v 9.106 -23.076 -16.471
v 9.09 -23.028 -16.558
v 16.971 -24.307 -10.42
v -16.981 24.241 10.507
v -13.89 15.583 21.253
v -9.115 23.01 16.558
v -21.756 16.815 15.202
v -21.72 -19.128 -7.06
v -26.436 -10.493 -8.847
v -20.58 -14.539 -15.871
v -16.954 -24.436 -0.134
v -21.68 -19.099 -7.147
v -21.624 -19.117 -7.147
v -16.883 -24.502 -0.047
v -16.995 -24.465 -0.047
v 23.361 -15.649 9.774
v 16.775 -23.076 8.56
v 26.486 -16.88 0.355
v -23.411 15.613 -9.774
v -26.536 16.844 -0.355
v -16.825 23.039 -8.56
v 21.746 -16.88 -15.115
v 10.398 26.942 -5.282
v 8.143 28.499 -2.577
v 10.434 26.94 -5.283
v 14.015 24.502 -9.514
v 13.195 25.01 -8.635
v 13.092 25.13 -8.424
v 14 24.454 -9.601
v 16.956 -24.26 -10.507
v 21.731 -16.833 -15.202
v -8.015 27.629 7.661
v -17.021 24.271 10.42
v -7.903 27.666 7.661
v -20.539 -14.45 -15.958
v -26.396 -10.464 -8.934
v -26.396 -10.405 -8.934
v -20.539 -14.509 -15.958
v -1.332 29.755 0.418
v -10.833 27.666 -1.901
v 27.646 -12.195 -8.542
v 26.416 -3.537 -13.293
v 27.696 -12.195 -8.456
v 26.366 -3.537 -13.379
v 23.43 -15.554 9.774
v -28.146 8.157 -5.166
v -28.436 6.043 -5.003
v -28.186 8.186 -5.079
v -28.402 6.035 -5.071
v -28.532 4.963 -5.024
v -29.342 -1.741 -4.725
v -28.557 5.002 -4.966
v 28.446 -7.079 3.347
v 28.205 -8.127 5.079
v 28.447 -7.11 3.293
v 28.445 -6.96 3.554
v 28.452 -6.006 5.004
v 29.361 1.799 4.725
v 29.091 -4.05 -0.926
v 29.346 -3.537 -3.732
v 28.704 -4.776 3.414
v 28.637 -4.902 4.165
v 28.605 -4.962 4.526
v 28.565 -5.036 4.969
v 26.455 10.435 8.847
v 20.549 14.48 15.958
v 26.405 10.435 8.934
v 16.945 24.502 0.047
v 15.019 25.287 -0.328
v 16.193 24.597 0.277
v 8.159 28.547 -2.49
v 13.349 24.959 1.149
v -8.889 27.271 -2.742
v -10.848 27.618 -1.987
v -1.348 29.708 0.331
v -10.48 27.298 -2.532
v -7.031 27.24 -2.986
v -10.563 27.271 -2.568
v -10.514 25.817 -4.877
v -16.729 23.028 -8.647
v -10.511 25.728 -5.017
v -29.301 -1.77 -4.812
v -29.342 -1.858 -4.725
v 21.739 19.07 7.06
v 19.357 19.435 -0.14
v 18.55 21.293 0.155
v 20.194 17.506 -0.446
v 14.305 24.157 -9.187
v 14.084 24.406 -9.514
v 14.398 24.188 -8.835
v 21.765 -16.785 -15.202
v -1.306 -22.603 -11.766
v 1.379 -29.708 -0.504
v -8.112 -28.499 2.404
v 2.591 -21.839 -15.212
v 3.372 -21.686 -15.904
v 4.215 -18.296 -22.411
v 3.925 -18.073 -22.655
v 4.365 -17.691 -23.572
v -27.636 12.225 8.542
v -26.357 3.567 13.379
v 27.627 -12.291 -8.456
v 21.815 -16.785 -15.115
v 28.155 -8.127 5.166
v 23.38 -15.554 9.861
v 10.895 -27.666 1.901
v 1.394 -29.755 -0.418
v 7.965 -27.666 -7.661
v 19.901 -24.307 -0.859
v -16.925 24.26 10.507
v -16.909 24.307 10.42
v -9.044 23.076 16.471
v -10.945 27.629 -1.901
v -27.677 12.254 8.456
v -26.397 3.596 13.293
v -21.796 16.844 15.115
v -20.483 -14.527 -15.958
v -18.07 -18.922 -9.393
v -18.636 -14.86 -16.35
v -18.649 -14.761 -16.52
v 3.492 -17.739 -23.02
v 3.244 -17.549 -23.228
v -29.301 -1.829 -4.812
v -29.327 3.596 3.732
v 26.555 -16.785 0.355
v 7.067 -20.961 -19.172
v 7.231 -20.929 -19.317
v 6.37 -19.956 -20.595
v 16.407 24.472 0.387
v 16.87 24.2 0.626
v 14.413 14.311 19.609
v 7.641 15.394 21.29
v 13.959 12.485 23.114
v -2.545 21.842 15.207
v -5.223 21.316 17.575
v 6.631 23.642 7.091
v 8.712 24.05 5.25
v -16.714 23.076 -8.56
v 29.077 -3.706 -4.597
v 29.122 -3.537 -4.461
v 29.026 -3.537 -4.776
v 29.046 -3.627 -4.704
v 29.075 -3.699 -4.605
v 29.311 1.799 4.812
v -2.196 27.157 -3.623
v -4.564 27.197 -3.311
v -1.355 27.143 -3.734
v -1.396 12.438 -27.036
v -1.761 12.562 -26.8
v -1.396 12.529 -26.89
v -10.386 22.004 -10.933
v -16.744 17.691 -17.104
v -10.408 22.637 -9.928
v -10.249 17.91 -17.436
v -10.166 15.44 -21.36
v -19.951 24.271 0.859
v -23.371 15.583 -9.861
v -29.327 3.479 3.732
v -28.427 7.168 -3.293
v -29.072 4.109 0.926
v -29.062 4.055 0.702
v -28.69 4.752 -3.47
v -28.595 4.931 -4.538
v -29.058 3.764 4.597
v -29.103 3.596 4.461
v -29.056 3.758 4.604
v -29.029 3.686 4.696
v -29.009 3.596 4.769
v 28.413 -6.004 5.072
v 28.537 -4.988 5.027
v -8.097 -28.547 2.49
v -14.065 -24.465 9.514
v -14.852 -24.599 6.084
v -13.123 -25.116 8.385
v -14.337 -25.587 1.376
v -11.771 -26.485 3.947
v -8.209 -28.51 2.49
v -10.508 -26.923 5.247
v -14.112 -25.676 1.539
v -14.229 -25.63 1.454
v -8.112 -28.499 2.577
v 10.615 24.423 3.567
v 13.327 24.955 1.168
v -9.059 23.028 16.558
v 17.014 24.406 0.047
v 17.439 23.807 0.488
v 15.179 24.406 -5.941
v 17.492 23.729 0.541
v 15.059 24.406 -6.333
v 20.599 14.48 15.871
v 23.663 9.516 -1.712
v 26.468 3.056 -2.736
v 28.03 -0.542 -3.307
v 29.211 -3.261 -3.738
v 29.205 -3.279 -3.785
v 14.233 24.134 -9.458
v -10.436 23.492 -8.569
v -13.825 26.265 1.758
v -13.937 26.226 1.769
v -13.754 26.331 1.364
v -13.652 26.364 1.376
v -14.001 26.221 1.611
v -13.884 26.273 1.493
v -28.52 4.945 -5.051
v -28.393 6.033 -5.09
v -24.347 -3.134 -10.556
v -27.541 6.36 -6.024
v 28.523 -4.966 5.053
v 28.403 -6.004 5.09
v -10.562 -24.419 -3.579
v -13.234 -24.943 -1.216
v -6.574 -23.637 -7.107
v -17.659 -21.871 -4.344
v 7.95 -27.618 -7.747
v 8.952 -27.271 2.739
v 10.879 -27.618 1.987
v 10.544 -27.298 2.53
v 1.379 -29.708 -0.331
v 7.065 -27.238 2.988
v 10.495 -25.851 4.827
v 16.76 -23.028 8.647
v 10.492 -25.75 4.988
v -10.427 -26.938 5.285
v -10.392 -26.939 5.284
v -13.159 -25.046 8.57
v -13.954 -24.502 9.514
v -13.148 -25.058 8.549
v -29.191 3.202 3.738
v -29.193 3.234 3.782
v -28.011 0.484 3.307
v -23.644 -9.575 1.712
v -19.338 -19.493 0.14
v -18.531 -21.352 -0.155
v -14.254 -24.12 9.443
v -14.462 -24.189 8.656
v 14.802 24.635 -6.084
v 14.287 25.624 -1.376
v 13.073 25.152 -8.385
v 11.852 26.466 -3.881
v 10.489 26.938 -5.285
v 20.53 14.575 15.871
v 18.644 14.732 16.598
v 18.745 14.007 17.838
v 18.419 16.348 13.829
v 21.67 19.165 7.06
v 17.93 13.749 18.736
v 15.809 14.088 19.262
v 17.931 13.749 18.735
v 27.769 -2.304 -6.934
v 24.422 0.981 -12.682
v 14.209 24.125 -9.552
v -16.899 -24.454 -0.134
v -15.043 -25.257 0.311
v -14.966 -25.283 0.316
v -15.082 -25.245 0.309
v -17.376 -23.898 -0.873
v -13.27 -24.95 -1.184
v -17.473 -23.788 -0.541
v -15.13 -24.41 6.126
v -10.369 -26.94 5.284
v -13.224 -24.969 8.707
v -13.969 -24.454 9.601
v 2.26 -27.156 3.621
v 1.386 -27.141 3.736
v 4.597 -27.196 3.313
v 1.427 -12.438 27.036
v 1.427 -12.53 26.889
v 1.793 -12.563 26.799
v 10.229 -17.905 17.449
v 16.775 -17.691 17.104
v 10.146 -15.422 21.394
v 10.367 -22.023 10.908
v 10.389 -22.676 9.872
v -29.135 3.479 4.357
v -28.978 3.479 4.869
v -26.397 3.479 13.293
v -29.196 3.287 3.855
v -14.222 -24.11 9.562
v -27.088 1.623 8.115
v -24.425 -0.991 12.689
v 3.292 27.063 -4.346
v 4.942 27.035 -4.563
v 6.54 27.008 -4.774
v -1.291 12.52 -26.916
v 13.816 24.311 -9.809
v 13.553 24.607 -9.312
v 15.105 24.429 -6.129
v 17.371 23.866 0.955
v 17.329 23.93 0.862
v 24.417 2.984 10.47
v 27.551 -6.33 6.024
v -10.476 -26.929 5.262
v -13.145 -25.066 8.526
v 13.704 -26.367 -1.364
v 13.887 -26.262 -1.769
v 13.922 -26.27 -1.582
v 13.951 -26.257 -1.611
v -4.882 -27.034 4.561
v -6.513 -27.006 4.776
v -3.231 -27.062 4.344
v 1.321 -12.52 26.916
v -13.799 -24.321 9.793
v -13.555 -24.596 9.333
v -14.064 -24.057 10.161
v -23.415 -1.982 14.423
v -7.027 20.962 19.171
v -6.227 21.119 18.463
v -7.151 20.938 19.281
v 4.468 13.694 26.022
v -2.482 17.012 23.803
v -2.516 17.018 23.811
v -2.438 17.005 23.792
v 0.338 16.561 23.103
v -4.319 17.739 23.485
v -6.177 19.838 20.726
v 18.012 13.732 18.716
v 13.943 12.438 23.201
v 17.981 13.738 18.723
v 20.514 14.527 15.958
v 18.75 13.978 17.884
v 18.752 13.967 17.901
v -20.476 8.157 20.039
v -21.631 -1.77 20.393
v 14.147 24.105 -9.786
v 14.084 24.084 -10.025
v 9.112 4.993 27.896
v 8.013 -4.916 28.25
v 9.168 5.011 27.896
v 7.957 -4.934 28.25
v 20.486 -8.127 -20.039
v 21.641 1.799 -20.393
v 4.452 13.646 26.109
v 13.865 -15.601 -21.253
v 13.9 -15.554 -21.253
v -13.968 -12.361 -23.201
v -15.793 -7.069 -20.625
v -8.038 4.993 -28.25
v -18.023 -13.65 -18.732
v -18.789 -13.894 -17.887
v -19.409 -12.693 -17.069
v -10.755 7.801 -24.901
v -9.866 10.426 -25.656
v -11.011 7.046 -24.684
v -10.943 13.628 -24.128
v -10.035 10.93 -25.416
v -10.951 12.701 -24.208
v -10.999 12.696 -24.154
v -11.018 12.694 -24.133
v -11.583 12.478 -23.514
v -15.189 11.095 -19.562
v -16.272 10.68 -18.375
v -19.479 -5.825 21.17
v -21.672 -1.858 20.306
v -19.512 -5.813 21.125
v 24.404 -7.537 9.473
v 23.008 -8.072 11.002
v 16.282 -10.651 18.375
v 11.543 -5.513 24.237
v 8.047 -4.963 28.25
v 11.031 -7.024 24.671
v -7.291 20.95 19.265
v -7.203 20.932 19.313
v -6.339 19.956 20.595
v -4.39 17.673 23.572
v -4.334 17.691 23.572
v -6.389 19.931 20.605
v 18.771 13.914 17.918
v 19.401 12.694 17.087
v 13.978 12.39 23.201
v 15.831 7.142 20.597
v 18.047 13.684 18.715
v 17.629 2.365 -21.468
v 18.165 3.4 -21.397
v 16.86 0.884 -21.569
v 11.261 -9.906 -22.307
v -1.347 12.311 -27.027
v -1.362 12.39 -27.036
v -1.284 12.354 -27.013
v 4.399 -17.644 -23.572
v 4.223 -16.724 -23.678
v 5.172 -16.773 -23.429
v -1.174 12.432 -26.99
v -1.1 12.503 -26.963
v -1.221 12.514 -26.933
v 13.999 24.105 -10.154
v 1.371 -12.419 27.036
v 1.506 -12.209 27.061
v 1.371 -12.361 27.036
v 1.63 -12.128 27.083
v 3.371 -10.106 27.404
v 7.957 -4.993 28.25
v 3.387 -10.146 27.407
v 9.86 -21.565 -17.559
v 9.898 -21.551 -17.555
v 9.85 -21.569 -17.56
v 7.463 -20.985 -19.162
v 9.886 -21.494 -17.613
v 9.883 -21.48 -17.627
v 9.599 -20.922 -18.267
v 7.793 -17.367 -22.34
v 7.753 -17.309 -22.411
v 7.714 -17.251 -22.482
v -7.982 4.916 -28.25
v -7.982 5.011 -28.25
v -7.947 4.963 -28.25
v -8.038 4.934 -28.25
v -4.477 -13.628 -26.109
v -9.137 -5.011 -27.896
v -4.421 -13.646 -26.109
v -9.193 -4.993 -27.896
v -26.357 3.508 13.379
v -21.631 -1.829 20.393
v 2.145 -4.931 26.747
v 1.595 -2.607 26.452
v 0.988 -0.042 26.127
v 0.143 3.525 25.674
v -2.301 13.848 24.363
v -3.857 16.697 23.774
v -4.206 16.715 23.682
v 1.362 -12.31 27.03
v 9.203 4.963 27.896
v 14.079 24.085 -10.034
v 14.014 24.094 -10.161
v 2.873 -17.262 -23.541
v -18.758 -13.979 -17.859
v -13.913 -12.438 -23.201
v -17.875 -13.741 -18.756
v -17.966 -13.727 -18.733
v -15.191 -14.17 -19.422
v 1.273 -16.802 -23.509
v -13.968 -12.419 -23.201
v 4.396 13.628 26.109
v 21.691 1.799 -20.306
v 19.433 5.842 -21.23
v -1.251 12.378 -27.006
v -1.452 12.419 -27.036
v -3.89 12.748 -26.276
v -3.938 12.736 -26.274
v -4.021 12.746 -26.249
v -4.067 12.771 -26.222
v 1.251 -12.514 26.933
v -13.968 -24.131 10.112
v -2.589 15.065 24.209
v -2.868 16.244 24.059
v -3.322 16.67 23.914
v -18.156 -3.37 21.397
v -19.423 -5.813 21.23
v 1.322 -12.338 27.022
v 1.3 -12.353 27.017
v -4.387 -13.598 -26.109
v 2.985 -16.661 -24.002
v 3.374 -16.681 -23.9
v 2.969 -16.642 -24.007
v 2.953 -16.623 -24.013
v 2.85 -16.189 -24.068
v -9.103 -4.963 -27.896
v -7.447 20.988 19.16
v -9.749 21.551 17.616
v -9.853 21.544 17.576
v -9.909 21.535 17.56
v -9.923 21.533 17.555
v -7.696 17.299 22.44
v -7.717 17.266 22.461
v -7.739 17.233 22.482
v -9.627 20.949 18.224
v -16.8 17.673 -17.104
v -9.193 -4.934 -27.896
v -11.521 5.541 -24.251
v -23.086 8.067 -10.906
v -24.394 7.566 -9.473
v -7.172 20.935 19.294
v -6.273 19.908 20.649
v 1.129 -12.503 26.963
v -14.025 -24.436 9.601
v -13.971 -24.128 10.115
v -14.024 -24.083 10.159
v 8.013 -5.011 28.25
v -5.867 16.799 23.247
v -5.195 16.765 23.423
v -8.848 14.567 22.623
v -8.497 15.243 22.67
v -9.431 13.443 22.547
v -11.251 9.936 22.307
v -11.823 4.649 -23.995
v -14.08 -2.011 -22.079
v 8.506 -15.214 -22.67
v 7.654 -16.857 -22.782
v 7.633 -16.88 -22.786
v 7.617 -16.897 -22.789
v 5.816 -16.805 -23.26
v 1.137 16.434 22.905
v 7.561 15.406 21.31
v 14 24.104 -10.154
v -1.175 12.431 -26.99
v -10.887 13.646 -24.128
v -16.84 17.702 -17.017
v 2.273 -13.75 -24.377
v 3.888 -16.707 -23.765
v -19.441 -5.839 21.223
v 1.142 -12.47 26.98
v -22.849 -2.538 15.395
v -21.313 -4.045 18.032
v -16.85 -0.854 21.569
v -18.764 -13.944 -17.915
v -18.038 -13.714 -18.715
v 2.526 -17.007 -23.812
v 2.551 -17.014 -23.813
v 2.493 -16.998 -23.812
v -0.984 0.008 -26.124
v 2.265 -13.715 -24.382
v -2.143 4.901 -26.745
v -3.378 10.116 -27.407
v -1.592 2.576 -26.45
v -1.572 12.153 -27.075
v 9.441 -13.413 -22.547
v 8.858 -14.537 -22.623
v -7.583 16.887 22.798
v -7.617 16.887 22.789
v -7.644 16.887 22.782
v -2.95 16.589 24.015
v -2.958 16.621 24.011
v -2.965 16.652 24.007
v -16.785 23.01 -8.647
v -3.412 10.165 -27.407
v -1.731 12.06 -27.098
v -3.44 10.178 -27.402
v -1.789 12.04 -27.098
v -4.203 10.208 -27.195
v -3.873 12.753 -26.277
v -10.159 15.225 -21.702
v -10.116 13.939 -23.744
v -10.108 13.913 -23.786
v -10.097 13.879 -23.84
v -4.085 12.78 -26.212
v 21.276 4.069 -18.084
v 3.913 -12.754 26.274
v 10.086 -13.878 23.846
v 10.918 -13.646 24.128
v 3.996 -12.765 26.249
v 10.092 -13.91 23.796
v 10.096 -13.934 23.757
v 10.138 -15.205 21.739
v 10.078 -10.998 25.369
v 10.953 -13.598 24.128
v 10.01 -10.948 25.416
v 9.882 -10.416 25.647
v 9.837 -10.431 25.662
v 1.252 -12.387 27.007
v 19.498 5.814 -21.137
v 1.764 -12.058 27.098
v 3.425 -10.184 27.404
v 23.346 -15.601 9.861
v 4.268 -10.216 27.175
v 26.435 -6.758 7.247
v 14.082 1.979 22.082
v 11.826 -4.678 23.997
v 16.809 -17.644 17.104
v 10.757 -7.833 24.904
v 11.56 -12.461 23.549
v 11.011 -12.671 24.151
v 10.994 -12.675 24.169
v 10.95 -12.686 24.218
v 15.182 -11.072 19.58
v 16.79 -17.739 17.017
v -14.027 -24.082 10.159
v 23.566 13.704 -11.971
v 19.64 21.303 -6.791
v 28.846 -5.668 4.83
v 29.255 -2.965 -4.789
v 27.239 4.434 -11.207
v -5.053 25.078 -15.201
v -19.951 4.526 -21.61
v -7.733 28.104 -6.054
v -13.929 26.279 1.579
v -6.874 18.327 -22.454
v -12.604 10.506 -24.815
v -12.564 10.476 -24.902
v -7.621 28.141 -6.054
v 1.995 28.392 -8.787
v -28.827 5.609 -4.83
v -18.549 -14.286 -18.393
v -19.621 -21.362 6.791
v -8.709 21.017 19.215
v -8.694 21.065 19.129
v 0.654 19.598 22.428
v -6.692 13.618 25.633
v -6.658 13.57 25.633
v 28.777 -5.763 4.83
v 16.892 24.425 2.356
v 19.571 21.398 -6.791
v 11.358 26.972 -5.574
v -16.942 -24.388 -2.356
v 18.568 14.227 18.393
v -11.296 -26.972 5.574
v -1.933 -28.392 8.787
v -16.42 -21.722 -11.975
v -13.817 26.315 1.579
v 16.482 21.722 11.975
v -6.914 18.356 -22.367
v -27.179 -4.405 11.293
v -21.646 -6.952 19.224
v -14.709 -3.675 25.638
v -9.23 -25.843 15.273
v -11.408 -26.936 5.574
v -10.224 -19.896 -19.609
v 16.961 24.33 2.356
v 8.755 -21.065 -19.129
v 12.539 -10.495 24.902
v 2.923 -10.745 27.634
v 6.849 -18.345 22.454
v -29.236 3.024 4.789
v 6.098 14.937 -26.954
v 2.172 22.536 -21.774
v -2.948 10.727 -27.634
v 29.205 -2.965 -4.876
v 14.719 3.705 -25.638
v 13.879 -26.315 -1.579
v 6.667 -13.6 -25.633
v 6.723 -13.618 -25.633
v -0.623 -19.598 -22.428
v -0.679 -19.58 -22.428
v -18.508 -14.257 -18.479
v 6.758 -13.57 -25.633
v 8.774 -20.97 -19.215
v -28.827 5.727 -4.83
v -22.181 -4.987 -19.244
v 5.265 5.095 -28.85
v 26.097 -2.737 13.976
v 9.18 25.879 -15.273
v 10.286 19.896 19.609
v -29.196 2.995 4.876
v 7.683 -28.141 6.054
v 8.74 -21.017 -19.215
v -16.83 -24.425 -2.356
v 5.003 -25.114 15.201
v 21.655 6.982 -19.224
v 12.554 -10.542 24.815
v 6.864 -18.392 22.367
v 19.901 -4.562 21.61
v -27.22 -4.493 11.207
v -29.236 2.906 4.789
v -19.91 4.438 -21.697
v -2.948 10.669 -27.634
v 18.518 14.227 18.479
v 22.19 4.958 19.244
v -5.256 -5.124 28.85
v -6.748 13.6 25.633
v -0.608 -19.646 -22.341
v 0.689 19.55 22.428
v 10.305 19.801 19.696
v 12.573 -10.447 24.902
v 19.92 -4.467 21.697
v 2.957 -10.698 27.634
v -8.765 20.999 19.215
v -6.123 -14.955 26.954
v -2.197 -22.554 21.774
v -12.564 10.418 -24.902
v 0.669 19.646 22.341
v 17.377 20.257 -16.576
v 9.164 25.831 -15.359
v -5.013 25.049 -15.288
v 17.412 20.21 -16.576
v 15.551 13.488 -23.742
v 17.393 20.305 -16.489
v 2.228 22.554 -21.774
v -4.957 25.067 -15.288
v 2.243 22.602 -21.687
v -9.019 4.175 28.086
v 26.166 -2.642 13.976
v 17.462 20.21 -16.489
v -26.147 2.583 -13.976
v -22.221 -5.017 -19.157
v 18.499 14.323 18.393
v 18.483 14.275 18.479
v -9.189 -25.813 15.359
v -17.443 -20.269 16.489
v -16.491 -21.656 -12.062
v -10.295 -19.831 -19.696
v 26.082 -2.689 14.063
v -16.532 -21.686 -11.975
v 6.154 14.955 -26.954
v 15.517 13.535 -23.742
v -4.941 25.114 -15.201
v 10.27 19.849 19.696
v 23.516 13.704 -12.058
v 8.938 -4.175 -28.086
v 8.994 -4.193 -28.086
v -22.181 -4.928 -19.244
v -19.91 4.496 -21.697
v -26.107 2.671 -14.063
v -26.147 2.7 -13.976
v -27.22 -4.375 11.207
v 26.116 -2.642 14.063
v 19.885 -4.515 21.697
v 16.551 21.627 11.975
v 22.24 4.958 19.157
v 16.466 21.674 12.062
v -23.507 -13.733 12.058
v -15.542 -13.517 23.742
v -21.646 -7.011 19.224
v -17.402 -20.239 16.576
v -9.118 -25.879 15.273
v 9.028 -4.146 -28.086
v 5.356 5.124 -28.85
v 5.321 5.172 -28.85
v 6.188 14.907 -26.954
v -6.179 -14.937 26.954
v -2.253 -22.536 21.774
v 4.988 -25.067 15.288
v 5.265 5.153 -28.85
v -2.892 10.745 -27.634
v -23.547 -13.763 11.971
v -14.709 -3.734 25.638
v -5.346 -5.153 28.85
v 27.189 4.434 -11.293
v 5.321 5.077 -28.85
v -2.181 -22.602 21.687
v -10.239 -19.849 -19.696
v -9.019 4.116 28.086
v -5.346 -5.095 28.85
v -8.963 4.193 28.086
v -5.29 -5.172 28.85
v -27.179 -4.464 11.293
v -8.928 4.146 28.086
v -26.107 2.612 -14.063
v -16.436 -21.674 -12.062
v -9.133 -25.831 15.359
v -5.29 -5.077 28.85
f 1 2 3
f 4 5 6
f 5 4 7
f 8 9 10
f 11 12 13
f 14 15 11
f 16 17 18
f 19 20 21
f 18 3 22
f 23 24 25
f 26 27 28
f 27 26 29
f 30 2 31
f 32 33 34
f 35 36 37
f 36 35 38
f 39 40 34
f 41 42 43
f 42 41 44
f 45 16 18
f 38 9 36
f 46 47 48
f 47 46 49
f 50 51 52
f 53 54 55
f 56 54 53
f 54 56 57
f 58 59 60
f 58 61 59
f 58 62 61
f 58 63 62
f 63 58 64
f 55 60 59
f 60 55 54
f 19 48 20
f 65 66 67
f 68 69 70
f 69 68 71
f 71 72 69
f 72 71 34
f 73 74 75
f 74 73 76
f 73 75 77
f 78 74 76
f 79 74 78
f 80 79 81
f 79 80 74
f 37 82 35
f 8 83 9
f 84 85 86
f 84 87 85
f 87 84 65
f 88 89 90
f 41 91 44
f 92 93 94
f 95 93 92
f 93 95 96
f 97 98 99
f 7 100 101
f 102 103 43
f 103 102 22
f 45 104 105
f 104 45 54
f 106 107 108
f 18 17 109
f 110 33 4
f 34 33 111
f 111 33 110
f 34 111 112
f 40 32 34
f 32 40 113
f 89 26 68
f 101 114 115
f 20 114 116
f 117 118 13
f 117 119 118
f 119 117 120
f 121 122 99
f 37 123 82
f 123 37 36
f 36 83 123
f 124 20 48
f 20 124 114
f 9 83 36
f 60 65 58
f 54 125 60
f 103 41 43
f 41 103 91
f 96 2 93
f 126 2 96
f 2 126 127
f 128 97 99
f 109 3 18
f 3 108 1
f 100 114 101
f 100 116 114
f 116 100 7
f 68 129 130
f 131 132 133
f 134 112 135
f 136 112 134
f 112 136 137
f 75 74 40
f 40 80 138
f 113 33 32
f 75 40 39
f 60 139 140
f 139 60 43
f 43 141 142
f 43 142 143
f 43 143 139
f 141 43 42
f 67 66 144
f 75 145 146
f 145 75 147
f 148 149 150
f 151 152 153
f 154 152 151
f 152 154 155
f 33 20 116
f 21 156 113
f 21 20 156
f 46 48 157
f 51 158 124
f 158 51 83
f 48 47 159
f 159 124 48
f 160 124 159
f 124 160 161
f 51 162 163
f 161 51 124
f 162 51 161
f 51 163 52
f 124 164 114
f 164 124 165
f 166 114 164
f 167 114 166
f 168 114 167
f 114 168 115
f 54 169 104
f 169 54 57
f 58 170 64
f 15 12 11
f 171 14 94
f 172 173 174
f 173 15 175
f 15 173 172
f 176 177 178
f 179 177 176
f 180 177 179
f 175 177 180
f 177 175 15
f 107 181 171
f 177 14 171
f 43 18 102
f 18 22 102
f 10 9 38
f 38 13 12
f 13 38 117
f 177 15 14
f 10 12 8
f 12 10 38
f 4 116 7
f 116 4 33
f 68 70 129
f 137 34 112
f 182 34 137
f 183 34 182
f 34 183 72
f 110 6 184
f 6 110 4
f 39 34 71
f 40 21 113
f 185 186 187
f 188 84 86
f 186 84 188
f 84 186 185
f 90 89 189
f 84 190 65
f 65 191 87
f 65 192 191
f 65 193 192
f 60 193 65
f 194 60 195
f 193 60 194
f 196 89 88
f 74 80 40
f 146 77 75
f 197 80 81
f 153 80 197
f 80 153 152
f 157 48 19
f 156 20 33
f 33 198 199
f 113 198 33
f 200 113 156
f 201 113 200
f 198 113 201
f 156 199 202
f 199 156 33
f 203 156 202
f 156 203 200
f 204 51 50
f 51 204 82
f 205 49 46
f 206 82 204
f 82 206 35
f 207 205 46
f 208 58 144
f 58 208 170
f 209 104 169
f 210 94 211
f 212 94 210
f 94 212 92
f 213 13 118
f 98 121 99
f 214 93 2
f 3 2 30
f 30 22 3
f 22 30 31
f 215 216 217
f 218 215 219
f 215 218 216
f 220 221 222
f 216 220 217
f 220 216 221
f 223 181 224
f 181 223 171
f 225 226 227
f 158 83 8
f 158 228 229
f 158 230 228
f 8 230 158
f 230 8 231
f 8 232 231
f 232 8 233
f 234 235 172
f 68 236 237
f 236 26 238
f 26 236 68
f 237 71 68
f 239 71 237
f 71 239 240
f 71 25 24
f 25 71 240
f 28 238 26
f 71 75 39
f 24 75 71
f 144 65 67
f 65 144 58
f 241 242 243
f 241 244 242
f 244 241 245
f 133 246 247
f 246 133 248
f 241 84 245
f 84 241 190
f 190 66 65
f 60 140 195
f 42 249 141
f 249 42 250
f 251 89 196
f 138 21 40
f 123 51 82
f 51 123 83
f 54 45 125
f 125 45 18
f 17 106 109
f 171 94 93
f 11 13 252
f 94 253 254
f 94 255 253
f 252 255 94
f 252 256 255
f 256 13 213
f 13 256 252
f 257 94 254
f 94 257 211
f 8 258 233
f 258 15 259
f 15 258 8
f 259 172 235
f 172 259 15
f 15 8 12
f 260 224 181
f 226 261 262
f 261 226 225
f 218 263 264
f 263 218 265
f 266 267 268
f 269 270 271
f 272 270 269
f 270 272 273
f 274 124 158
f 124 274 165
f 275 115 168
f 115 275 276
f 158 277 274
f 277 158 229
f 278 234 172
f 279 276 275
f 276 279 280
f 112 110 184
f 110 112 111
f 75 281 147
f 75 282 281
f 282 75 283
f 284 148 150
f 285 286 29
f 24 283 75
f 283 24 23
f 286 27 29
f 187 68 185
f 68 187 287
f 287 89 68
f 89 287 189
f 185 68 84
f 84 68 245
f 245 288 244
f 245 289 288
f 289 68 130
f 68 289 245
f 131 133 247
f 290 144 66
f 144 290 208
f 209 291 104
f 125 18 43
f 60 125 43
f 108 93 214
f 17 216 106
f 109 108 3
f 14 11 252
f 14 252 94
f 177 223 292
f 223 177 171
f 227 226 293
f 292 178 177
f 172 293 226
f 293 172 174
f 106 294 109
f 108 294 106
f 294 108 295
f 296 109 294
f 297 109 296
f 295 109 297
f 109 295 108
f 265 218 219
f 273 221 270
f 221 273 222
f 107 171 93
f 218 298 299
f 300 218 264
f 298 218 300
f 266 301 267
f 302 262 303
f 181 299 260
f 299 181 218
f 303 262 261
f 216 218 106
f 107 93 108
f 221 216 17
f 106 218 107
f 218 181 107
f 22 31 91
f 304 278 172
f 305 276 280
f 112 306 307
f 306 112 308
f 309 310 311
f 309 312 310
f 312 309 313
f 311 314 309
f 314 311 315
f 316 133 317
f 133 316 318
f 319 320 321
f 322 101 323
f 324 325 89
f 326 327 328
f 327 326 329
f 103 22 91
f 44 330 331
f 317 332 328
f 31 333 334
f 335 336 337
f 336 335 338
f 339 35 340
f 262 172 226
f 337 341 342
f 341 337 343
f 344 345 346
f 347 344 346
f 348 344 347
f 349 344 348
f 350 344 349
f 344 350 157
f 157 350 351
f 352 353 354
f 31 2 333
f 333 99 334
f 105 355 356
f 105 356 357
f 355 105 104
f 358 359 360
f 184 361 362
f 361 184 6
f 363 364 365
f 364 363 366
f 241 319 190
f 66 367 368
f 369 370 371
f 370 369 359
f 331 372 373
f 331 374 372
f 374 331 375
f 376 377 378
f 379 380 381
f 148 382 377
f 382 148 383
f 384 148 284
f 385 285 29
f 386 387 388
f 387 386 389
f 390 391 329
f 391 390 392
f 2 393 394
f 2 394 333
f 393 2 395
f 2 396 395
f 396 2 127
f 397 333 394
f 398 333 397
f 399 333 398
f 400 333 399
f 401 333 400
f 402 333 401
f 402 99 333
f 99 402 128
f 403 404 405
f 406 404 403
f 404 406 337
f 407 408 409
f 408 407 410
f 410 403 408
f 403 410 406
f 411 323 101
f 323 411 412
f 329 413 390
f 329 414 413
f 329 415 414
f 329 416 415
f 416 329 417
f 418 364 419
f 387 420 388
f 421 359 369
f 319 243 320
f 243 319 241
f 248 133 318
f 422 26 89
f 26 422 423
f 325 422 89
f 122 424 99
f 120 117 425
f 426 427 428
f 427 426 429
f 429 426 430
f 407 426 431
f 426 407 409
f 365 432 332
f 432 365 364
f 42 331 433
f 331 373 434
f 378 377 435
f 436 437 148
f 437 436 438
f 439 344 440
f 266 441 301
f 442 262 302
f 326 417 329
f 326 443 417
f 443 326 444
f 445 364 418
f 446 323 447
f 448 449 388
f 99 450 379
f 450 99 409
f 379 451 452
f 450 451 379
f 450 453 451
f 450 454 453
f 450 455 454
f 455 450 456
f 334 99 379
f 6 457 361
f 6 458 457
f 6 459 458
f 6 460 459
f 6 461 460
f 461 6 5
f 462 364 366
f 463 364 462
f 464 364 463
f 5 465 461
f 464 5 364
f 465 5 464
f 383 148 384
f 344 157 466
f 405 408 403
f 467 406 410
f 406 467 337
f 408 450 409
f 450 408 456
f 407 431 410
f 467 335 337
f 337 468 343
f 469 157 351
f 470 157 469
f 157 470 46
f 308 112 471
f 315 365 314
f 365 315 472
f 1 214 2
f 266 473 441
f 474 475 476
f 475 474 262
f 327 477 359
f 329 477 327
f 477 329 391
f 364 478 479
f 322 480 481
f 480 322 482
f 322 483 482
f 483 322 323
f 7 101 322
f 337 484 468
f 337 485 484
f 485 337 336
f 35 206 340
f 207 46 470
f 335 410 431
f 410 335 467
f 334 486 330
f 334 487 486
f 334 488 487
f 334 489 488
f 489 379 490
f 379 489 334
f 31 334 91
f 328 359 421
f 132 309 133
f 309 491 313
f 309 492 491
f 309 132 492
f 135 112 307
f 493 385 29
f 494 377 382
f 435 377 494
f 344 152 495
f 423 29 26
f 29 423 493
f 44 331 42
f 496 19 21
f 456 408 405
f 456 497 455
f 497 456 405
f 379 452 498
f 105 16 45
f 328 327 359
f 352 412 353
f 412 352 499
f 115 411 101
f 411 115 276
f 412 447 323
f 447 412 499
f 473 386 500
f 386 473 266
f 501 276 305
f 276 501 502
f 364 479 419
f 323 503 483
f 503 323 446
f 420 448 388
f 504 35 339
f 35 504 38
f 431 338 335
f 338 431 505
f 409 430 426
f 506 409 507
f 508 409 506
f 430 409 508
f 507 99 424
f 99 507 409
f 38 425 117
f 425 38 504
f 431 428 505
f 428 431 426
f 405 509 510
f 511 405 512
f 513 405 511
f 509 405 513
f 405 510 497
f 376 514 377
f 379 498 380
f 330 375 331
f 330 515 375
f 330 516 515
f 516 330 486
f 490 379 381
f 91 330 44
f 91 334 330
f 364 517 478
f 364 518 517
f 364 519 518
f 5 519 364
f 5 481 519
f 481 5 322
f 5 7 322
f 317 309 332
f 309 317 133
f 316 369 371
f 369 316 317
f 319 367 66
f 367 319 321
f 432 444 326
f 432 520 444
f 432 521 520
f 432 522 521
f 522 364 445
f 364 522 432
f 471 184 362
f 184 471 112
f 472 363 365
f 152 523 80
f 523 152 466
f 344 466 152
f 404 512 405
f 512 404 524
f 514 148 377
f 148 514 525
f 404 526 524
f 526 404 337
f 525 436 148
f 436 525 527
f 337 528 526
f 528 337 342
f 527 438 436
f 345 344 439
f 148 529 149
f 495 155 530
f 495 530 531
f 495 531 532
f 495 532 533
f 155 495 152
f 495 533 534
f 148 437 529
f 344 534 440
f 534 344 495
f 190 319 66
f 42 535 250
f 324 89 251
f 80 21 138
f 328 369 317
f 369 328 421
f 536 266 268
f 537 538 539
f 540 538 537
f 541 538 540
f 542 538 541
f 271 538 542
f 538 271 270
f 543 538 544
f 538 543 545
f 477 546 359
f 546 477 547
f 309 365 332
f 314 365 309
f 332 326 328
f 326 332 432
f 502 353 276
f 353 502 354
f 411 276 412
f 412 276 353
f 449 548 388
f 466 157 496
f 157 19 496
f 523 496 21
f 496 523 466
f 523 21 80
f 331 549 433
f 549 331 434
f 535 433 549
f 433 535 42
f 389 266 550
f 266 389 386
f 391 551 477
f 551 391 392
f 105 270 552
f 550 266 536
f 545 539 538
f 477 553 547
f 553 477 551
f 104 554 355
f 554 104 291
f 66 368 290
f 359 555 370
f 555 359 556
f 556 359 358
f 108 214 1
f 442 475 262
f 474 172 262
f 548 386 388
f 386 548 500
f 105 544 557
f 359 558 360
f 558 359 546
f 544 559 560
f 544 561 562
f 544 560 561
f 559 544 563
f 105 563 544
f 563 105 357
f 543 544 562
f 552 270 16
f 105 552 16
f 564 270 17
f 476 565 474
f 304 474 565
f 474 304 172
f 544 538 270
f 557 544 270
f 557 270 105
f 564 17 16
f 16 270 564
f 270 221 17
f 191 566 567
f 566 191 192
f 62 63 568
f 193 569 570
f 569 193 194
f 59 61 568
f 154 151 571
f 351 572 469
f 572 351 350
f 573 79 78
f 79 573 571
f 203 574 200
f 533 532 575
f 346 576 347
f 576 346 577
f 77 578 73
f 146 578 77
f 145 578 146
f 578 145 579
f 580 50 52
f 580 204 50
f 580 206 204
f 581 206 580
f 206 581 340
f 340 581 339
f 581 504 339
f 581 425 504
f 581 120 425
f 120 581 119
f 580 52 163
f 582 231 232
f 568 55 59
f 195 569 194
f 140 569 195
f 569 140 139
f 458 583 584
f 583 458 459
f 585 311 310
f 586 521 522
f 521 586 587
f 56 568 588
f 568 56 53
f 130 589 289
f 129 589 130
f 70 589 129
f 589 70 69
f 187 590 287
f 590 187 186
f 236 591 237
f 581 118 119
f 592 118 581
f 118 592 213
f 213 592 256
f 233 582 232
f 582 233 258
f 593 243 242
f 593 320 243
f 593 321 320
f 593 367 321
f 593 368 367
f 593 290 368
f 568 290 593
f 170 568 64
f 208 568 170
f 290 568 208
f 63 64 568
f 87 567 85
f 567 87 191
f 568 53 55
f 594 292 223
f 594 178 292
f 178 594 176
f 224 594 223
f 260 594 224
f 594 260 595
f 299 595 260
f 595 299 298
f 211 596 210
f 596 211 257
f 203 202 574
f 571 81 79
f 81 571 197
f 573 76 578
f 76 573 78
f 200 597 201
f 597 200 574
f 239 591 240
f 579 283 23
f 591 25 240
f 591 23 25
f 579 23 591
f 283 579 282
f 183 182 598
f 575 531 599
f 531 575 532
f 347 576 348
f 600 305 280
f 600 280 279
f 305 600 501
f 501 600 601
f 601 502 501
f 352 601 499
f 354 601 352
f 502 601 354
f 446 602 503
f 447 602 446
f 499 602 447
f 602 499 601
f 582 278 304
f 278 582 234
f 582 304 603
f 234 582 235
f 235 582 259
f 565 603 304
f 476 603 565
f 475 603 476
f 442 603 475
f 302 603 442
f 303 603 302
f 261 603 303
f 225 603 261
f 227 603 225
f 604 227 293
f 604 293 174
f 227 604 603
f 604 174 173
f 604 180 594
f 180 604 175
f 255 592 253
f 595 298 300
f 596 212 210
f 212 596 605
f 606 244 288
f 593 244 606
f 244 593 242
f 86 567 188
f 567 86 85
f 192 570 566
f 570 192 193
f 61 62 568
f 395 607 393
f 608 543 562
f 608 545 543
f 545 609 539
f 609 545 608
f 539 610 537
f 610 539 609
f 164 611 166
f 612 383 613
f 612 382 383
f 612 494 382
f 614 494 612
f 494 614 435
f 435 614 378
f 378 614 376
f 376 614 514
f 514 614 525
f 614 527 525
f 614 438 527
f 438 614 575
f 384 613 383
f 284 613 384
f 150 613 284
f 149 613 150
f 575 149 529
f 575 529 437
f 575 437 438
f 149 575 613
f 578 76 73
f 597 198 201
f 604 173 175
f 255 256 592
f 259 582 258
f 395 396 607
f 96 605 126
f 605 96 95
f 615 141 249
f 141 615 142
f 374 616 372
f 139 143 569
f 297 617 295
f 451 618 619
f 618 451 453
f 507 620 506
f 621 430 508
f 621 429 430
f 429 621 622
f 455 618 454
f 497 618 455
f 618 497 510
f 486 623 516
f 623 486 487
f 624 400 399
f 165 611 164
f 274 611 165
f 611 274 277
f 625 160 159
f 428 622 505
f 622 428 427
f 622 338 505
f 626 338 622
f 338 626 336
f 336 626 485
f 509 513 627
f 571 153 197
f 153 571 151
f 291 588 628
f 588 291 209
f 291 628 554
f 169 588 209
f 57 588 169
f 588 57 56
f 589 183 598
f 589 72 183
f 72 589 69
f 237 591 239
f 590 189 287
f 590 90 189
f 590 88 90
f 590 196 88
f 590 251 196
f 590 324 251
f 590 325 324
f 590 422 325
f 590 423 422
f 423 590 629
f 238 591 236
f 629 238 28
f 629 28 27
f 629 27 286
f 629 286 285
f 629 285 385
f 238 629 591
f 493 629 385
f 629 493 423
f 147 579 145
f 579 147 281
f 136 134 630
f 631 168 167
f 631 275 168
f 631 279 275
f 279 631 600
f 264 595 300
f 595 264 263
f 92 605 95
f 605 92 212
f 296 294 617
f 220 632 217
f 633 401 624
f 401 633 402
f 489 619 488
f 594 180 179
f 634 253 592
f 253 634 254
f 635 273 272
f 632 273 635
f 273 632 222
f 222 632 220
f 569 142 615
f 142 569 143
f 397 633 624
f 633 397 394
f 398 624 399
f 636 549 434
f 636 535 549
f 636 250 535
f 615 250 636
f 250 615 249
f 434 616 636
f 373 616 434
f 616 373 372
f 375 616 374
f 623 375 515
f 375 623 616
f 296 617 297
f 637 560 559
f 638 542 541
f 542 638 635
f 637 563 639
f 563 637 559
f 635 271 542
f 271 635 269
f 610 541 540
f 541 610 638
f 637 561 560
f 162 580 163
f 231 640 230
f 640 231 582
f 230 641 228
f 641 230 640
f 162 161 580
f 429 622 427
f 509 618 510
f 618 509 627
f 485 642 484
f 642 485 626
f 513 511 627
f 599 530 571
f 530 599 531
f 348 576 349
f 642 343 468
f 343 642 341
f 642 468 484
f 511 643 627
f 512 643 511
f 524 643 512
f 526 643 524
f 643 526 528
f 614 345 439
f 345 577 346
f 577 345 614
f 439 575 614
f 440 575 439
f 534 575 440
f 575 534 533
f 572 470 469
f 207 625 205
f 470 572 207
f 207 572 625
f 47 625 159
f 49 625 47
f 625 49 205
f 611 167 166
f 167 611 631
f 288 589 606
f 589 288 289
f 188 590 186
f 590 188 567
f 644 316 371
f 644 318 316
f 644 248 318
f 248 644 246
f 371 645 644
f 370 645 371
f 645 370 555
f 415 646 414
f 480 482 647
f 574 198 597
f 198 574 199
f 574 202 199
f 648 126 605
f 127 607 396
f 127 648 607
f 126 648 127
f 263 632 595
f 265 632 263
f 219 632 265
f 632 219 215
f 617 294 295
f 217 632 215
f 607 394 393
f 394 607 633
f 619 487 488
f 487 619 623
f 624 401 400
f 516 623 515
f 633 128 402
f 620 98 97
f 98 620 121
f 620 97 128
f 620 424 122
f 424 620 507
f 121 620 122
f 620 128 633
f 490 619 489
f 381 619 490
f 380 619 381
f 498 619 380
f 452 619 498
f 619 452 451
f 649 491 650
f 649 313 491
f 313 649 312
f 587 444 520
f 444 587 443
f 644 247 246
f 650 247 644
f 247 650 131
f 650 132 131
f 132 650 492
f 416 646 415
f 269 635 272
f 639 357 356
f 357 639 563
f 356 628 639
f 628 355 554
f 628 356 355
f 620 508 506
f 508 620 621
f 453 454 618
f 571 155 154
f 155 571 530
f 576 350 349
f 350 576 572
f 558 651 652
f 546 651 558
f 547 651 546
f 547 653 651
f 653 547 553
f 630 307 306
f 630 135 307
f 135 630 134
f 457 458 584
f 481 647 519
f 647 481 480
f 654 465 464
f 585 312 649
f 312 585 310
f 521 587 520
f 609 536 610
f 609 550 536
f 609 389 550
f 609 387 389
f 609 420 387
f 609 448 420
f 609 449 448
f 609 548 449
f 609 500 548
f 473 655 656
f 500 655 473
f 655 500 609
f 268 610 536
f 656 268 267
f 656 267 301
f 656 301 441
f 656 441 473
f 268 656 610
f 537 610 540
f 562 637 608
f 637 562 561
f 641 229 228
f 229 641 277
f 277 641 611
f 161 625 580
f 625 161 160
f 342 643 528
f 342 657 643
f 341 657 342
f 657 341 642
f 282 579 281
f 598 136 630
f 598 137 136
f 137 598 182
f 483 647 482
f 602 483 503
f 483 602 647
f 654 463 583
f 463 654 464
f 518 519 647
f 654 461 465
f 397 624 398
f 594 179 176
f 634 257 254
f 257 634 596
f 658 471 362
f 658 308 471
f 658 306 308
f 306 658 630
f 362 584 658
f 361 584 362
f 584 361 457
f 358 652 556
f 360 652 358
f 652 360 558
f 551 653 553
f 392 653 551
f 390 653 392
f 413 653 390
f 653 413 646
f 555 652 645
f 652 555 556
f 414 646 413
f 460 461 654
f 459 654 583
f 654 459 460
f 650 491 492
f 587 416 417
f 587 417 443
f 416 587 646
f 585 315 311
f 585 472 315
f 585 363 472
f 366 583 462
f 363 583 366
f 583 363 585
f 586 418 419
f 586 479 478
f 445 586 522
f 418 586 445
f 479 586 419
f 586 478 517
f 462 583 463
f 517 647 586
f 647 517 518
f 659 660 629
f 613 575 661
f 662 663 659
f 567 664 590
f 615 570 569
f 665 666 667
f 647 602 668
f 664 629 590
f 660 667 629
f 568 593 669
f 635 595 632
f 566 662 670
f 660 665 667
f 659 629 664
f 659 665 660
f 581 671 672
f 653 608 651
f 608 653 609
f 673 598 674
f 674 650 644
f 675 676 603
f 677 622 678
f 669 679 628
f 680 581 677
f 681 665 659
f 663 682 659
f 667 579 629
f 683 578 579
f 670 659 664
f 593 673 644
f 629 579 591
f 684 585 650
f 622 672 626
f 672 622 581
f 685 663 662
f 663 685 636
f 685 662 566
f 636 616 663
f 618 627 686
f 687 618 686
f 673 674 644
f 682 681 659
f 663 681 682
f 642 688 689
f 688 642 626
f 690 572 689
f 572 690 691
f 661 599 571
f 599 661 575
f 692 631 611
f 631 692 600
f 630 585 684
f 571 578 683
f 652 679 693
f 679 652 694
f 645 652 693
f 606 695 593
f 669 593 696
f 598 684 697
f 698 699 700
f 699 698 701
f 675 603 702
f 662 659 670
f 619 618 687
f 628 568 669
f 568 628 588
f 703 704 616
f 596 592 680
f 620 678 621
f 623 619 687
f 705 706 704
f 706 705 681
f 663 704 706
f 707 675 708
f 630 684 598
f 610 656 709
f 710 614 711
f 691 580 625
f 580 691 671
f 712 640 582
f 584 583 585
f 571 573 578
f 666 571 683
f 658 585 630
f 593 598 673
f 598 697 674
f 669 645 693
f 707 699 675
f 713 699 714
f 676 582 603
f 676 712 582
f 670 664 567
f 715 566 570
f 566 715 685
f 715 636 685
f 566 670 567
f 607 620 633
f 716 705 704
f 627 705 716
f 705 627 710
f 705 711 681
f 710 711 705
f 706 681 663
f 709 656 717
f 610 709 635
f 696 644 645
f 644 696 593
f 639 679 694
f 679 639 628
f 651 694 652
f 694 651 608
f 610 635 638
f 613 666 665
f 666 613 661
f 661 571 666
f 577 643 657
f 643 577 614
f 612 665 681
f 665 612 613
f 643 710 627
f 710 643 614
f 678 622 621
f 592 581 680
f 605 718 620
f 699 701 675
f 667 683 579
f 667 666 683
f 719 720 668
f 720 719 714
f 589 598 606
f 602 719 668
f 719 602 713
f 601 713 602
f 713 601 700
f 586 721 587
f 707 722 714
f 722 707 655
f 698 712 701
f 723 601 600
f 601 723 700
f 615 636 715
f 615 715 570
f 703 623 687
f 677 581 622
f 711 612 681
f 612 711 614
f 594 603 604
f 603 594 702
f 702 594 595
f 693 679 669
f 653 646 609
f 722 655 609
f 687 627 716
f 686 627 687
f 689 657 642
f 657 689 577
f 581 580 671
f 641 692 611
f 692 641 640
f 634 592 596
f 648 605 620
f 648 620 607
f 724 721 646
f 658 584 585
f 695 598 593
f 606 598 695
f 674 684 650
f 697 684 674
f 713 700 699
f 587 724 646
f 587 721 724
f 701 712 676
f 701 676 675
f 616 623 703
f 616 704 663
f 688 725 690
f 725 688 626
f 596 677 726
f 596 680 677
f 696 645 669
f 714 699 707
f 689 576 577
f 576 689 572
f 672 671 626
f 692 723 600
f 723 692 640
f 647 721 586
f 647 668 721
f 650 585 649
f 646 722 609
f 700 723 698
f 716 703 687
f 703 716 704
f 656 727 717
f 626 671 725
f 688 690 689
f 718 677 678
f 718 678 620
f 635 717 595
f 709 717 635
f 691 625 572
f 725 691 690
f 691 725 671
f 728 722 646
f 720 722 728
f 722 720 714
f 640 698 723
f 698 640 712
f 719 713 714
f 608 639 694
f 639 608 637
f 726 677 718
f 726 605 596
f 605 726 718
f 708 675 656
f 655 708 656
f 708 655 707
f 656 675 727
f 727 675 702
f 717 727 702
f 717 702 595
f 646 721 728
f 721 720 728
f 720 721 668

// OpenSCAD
// Auto-generated OpenSCAD file

    inner_points = 10*[[-1.6451036775652808, -2.1626836934703126, -1.1975226886664396], [1.686072709471346, 2.432955782684813, 0.2356107715886286], [-1.6860727094713472, -2.4329557826848114, -0.2356107715886286], [1.6451036775652794, 2.1626836934703144, 1.1975226886664396], [-2.6884846067758437, 1.2389917062429145, 0.233618340039301], [-2.1194517463573437, 2.0240206487946675, 0.47842676129971456], [2.119451746357343, -2.0240206487946657, -0.47842676129971456], [2.6884846067758428, -1.2389917062429128, -0.233618340039301], [-0.2907283441631142, 1.0697947112799653, -2.7547493104508978], [-0.5305652343997654, -0.5124056576130412, 2.8763811346733195], [0.5305652343997641, 0.5124056576130432, -2.8763811346733195], [0.2907283441631129, -1.0697947112799635, 2.7547493104508978], [-1.8467649995645183, -1.4227471690324143, -1.839259902027394], [1.1327297390179003, 2.68771773847334, -0.5574263668434638], [-1.95402331758078, -2.130328684806416, 0.6790581910658857], [1.0254714210016385, 1.9801362226993382, 1.9608917262498158], [-1.0254714210016398, -1.9801362226993364, -1.9608917262498158], [1.9540233175807786, 2.130328684806418, -0.6790581910658857], [-1.1327297390179016, -2.687717738473338, 0.5574263668434638], [1.846764999564517, 1.422747169032416, 1.839259902027394], [-2.87456367211222, 0.5667833051879534, -0.4829780924069351], [-1.3848163028210105, 2.6220157589408304, 0.15793867518503008], [-2.915532704018286, 0.2965112159734543, 0.47893382467087603], [-1.425785334727077, 2.351743669726331, 1.1198505922628412], [1.4257853347270757, -2.3517436697263294, -1.1198505922628412], [2.9155327040182852, -0.2965112159734523, -0.47893382467087603], [1.3848163028210092, -2.6220157589408286, -0.15793867518503008], [2.874563672112219, -0.5667833051879514, 0.4829780924069351], [-1.2523453639028133, 1.0446987882266965, -2.48150417875951], [-0.6833125034843128, 1.8297277307784492, -2.2366957574990964], [-1.4668619999353363, -0.3704642433213059, 2.5551320074270496], [-0.8978291395168357, 0.4145646992304467, 2.799940428687463], [0.8978291395168344, -0.4145646992304447, -2.799940428687463], [1.466861999935335, 0.3704642433213079, -2.5551320074270496], [0.6833125034843115, -1.8297277307784474, 2.2366957574990964], [1.252345363902812, -1.0446987882266947, 2.48150417875951], [-2.214028904681588, -0.49577681218892655, -1.9157006080132506], [0.1964329734823296, 2.829659152765075, -0.8786754940897339], [-2.3466074769019785, -1.370395665307932, 1.197111744017687], [0.06385440126193956, 1.9550402996460696, 2.2341368579412038], [-0.06385440126194084, -1.9550402996460678, -2.2341368579412038], [2.3466074769019776, 1.3703956653079339, -1.197111744017687], [-0.19643297348233088, -2.8296591527650734, 0.8786754940897339], [2.2140289046815873, 0.49577681218892855, 1.9157006080132506], [-2.606613064002787, 0.2641562073095579, -1.3976470550614495], [-0.7651840462573698, 2.8045632297118064, -0.6054303623983461], [-2.7138713820190485, -0.44342530846444383, 1.1206710380318305], [-0.8724423642736312, 2.096981713937805, 1.9128877306949337], [0.8724423642736299, -2.096981713937803, -1.9128877306949337], [2.7138713820190477, 0.44342530846444583, -1.1206710380318305], [0.7651840462573685, -2.8045632297118046, 0.6054303623983461], [2.606613064002786, -0.2641562073095559, 1.3976470550614495], [-1.9869808074391464, 0.4467036780805339, -2.161016092644826], [-0.4972334381479373, 2.5019361318334106, -1.5200993250528605], [-2.1605284115656027, -0.6981872642529703, 1.913708176463923], [-0.6707810422743935, 1.3570451894999065, 2.554624944055888], [0.6707810422743922, -1.3570451894999047, -2.554624944055888], [2.160528411565602, 0.6981872642529723, -1.913708176463923], [0.49723343814793597, -2.501936131833409, 1.5200993250528605], [1.986980807439145, -0.4467036780805319, 2.161016092644826], [-1.5501088369047502, -1.3487833733431578, 2.36549645177391], [0.22122791204797956, 2.2506578071333787, -2.1686920260683786], [-0.22122791204798084, -2.250657807133377, 2.1686920260683786], [1.5501088369047489, 1.3487833733431596, -2.36549645177391], [-1.7361879022411257, -2.020991774398119, 1.648900019327674], [0.914894323678246, 2.578380828065043, -1.5272681951052522], [-0.9148943236782473, -2.578380828065041, 1.5272681951052522], [1.7361879022411244, 2.0209917743981207, -1.648900019327674], [-0.6138120713691793, -1.490724787634893, 2.6867455790201804], [0.6138120713691779, 1.4907247876348948, -2.6867455790201804]];

    outer_points = 10*[[-0.8127781095257554, -2.8451711072731785, 0.24903929976162134], [-0.13633829193286426, 2.9660232971458376, 0.04177473821664251], [0.13633829193286426, -2.9660232971458376, -0.04177473821664251], [0.8127781095257554, 2.8451711072731785, -0.24903929976162134], [0.7997377853601801, -0.49633525670734463, 2.816327084240848], [0.9152875010113133, 0.49633525670734463, 2.7809220703309587], [-0.9152875010113133, -0.49633525670734463, -2.7809220703309587], [-0.7997377853601801, 0.49633525670734463, -2.816327084240848], [-2.631631449063583, 0.3537405211795562, 1.329289666621699], [2.9245927429151473, -0.3537405211795562, -0.37316536491986596], [-2.9245927429151473, 0.3537405211795562, 0.37316536491986596], [2.631631449063583, -0.3537405211795562, -1.329289666621699], [-1.3984419351885988, -2.440647573398727, 0.9514341985555175], [-0.7934157692584937, 2.757042714100203, 0.7660511389790129], [1.0863770631100578, -2.757042714100203, 0.19007316272281993], [1.6914032290401628, 2.440647573398727, 0.00469010314631535], [-1.6914032290401628, -2.440647573398727, -0.00469010314631535], [-1.0863770631100578, 2.757042714100203, -0.19007316272281993], [0.7934157692584937, -2.757042714100203, -0.7660511389790129], [1.3984419351885988, 2.440647573398727, -0.9514341985555175], [0.14116788247970447, -1.2389964769384032, 2.6949187032084154], [0.443680965444757, 1.3598486668110619, 2.602227173420163], [1.090284283938324, -1.3598486668110619, 2.4041046652301516], [1.3927973669033766, 1.2389964769384032, 2.3114131354418994], [-1.3927973669033766, -1.2389964769384032, -2.3114131354418994], [-1.090284283938324, 1.3598486668110619, -2.4041046652301516], [-0.443680965444757, -1.3598486668110619, -2.602227173420163], [-0.14116788247970447, 1.2389964769384032, -2.6949187032084154], [-2.159102543778453, -0.17994011600586796, 2.030646502450221], [-2.0435528281273196, 0.8127303974088214, 1.9952414885403318], [2.8105354528188604, -0.8127303974088214, 0.5079244307848257], [2.9260851684699936, 0.17994011600586796, 0.4725194168749366], [-2.9260851684699936, -0.17994011600586796, -0.4725194168749366], [-2.8105354528188604, 0.8127303974088214, -0.5079244307848257], [2.0435528281273196, -0.8127303974088214, -1.9952414885403318], [2.159102543778453, 0.17994011600586796, -2.030646502450221], [-1.3969495096337523, -1.9069669362133024, 1.7971189803503202], [-0.9074730593547807, 2.298052837870938, 1.6471409346837047], [1.6744556840463214, -2.298052837870938, 0.8560249846414527], [2.163932134325293, 1.9069669362133024, 0.7060469389748373], [-2.163932134325293, -1.9069669362133024, -0.7060469389748373], [-1.6744556840463214, 2.298052837870938, -0.8560249846414527], [0.9074730593547807, -2.298052837870938, -1.6471409346837047], [1.3969495096337523, 1.9069669362133024, -1.7971189803503202], [-0.8088708886974889, -1.4479770599840374, 2.4630708022689527], [-0.4349441540696506, 1.764372200685514, 2.3484977705122265], [1.6759481096011677, -1.764372200685514, 1.7017097664362553], [2.049874844229006, 1.4479770599840374, 1.5871367346795289], [-2.049874844229006, -1.4479770599840374, -1.5871367346795289], [-1.6759481096011677, 1.764372200685514, -1.7017097664362553], [0.4349441540696506, -1.764372200685514, -2.3484977705122265], [0.8088708886974889, 1.4479770599840374, -2.4630708022689527], [-1.6874960082118968, -1.0434535261095852, 2.2093413993610165], [-1.384982925246844, 1.5553916176398799, 2.116649869572764], [2.3330255869267966, -1.5553916176398799, 0.9774333656738852], [2.6355386698918495, 1.0434535261095852, 0.8847418358856328], [-2.6355386698918495, -1.0434535261095852, -0.8847418358856328], [-2.3330255869267966, 1.5553916176398799, -0.9774333656738852], [1.384982925246844, -1.5553916176398799, -2.116649869572764], [1.6874960082118968, 1.0434535261095852, -2.2093413993610165], [2.645537886674456, -1.6785392291321632, 0.03553595709364332], [-2.17151655583448, 1.6785392291321632, 1.5115056605296813], [2.17151655583448, -1.6785392291321632, -1.5115056605296813], [-2.645537886674456, 1.6785392291321632, -0.03553595709364332], [1.9869679837939802, -2.4212004493632215, -0.08587242393878891], [-1.6940066899424162, 2.4212004493632215, 1.0419967256406217], [1.6940066899424162, -2.4212004493632215, -1.0419967256406217], [-1.9869679837939802, 2.4212004493632215, 0.08587242393878891], [2.759595176770743, -1.219549352902898, -0.8455538386110483], [-2.759595176770743, 1.219549352902898, 0.8455538386110483]];

    // Convex hull for inner set (I)
    module inner_hull() {
        hull() {
            for (p = inner_points) {
                translate(p) sphere(r=0.1);
            }
        }
    }

    // Convex hull for outer set (O) minus inner hull (O \ I)
    module outer_minus_inner() {
        difference() {
            hull() {
                for (p = outer_points) {
                    translate(p) sphere(r=0.1);
                }
            }
            inner_hull(); // Subtract inner hull
        }
    }

    // Convex hull for outer set (O) minus all translated inner hulls
    module outer_minus_AllTranslationInner() {
        difference() {
            hull() {
                for (p = outer_points) {
                    translate(p) sphere(r=0.1);
                }
            }
            hull() {
                translate([0,0,50]) inner_hull();
                translate([0,0,-50]) inner_hull();
            }; // Subtract translated inner hulls
        }
    }

    // Difference between outer_minus_inner and outer_minus_AllTranslationInner
    module outer_minus_inner_diff() {
        difference() {
            // Outer minus inner
            difference() {
                hull() {
                    for (p = outer_points) {
                        translate(p) sphere(r=0.1);
                    }
                }
                inner_hull();
            }

            // Subtract Outer minus AllTranslationInner
            difference() {
                hull() {
                    for (p = outer_points) {
                        translate(p) sphere(r=0.1);
                    }
                }
                hull() {
                    translate([0,0,50]) inner_hull();
                    translate([0,0,-50]) inner_hull();
                };
            }
        }
    }

    // Rendering all with colors applied
    color([1, 0, 0, 0.5]) inner_hull(); // Transparent red
    color([0, 1, 0, 1]) outer_minus_AllTranslationInner(); // Opaque green
    color([1, 1, 0, 1]) outer_minus_inner_diff(); // Opaque yellow
    
